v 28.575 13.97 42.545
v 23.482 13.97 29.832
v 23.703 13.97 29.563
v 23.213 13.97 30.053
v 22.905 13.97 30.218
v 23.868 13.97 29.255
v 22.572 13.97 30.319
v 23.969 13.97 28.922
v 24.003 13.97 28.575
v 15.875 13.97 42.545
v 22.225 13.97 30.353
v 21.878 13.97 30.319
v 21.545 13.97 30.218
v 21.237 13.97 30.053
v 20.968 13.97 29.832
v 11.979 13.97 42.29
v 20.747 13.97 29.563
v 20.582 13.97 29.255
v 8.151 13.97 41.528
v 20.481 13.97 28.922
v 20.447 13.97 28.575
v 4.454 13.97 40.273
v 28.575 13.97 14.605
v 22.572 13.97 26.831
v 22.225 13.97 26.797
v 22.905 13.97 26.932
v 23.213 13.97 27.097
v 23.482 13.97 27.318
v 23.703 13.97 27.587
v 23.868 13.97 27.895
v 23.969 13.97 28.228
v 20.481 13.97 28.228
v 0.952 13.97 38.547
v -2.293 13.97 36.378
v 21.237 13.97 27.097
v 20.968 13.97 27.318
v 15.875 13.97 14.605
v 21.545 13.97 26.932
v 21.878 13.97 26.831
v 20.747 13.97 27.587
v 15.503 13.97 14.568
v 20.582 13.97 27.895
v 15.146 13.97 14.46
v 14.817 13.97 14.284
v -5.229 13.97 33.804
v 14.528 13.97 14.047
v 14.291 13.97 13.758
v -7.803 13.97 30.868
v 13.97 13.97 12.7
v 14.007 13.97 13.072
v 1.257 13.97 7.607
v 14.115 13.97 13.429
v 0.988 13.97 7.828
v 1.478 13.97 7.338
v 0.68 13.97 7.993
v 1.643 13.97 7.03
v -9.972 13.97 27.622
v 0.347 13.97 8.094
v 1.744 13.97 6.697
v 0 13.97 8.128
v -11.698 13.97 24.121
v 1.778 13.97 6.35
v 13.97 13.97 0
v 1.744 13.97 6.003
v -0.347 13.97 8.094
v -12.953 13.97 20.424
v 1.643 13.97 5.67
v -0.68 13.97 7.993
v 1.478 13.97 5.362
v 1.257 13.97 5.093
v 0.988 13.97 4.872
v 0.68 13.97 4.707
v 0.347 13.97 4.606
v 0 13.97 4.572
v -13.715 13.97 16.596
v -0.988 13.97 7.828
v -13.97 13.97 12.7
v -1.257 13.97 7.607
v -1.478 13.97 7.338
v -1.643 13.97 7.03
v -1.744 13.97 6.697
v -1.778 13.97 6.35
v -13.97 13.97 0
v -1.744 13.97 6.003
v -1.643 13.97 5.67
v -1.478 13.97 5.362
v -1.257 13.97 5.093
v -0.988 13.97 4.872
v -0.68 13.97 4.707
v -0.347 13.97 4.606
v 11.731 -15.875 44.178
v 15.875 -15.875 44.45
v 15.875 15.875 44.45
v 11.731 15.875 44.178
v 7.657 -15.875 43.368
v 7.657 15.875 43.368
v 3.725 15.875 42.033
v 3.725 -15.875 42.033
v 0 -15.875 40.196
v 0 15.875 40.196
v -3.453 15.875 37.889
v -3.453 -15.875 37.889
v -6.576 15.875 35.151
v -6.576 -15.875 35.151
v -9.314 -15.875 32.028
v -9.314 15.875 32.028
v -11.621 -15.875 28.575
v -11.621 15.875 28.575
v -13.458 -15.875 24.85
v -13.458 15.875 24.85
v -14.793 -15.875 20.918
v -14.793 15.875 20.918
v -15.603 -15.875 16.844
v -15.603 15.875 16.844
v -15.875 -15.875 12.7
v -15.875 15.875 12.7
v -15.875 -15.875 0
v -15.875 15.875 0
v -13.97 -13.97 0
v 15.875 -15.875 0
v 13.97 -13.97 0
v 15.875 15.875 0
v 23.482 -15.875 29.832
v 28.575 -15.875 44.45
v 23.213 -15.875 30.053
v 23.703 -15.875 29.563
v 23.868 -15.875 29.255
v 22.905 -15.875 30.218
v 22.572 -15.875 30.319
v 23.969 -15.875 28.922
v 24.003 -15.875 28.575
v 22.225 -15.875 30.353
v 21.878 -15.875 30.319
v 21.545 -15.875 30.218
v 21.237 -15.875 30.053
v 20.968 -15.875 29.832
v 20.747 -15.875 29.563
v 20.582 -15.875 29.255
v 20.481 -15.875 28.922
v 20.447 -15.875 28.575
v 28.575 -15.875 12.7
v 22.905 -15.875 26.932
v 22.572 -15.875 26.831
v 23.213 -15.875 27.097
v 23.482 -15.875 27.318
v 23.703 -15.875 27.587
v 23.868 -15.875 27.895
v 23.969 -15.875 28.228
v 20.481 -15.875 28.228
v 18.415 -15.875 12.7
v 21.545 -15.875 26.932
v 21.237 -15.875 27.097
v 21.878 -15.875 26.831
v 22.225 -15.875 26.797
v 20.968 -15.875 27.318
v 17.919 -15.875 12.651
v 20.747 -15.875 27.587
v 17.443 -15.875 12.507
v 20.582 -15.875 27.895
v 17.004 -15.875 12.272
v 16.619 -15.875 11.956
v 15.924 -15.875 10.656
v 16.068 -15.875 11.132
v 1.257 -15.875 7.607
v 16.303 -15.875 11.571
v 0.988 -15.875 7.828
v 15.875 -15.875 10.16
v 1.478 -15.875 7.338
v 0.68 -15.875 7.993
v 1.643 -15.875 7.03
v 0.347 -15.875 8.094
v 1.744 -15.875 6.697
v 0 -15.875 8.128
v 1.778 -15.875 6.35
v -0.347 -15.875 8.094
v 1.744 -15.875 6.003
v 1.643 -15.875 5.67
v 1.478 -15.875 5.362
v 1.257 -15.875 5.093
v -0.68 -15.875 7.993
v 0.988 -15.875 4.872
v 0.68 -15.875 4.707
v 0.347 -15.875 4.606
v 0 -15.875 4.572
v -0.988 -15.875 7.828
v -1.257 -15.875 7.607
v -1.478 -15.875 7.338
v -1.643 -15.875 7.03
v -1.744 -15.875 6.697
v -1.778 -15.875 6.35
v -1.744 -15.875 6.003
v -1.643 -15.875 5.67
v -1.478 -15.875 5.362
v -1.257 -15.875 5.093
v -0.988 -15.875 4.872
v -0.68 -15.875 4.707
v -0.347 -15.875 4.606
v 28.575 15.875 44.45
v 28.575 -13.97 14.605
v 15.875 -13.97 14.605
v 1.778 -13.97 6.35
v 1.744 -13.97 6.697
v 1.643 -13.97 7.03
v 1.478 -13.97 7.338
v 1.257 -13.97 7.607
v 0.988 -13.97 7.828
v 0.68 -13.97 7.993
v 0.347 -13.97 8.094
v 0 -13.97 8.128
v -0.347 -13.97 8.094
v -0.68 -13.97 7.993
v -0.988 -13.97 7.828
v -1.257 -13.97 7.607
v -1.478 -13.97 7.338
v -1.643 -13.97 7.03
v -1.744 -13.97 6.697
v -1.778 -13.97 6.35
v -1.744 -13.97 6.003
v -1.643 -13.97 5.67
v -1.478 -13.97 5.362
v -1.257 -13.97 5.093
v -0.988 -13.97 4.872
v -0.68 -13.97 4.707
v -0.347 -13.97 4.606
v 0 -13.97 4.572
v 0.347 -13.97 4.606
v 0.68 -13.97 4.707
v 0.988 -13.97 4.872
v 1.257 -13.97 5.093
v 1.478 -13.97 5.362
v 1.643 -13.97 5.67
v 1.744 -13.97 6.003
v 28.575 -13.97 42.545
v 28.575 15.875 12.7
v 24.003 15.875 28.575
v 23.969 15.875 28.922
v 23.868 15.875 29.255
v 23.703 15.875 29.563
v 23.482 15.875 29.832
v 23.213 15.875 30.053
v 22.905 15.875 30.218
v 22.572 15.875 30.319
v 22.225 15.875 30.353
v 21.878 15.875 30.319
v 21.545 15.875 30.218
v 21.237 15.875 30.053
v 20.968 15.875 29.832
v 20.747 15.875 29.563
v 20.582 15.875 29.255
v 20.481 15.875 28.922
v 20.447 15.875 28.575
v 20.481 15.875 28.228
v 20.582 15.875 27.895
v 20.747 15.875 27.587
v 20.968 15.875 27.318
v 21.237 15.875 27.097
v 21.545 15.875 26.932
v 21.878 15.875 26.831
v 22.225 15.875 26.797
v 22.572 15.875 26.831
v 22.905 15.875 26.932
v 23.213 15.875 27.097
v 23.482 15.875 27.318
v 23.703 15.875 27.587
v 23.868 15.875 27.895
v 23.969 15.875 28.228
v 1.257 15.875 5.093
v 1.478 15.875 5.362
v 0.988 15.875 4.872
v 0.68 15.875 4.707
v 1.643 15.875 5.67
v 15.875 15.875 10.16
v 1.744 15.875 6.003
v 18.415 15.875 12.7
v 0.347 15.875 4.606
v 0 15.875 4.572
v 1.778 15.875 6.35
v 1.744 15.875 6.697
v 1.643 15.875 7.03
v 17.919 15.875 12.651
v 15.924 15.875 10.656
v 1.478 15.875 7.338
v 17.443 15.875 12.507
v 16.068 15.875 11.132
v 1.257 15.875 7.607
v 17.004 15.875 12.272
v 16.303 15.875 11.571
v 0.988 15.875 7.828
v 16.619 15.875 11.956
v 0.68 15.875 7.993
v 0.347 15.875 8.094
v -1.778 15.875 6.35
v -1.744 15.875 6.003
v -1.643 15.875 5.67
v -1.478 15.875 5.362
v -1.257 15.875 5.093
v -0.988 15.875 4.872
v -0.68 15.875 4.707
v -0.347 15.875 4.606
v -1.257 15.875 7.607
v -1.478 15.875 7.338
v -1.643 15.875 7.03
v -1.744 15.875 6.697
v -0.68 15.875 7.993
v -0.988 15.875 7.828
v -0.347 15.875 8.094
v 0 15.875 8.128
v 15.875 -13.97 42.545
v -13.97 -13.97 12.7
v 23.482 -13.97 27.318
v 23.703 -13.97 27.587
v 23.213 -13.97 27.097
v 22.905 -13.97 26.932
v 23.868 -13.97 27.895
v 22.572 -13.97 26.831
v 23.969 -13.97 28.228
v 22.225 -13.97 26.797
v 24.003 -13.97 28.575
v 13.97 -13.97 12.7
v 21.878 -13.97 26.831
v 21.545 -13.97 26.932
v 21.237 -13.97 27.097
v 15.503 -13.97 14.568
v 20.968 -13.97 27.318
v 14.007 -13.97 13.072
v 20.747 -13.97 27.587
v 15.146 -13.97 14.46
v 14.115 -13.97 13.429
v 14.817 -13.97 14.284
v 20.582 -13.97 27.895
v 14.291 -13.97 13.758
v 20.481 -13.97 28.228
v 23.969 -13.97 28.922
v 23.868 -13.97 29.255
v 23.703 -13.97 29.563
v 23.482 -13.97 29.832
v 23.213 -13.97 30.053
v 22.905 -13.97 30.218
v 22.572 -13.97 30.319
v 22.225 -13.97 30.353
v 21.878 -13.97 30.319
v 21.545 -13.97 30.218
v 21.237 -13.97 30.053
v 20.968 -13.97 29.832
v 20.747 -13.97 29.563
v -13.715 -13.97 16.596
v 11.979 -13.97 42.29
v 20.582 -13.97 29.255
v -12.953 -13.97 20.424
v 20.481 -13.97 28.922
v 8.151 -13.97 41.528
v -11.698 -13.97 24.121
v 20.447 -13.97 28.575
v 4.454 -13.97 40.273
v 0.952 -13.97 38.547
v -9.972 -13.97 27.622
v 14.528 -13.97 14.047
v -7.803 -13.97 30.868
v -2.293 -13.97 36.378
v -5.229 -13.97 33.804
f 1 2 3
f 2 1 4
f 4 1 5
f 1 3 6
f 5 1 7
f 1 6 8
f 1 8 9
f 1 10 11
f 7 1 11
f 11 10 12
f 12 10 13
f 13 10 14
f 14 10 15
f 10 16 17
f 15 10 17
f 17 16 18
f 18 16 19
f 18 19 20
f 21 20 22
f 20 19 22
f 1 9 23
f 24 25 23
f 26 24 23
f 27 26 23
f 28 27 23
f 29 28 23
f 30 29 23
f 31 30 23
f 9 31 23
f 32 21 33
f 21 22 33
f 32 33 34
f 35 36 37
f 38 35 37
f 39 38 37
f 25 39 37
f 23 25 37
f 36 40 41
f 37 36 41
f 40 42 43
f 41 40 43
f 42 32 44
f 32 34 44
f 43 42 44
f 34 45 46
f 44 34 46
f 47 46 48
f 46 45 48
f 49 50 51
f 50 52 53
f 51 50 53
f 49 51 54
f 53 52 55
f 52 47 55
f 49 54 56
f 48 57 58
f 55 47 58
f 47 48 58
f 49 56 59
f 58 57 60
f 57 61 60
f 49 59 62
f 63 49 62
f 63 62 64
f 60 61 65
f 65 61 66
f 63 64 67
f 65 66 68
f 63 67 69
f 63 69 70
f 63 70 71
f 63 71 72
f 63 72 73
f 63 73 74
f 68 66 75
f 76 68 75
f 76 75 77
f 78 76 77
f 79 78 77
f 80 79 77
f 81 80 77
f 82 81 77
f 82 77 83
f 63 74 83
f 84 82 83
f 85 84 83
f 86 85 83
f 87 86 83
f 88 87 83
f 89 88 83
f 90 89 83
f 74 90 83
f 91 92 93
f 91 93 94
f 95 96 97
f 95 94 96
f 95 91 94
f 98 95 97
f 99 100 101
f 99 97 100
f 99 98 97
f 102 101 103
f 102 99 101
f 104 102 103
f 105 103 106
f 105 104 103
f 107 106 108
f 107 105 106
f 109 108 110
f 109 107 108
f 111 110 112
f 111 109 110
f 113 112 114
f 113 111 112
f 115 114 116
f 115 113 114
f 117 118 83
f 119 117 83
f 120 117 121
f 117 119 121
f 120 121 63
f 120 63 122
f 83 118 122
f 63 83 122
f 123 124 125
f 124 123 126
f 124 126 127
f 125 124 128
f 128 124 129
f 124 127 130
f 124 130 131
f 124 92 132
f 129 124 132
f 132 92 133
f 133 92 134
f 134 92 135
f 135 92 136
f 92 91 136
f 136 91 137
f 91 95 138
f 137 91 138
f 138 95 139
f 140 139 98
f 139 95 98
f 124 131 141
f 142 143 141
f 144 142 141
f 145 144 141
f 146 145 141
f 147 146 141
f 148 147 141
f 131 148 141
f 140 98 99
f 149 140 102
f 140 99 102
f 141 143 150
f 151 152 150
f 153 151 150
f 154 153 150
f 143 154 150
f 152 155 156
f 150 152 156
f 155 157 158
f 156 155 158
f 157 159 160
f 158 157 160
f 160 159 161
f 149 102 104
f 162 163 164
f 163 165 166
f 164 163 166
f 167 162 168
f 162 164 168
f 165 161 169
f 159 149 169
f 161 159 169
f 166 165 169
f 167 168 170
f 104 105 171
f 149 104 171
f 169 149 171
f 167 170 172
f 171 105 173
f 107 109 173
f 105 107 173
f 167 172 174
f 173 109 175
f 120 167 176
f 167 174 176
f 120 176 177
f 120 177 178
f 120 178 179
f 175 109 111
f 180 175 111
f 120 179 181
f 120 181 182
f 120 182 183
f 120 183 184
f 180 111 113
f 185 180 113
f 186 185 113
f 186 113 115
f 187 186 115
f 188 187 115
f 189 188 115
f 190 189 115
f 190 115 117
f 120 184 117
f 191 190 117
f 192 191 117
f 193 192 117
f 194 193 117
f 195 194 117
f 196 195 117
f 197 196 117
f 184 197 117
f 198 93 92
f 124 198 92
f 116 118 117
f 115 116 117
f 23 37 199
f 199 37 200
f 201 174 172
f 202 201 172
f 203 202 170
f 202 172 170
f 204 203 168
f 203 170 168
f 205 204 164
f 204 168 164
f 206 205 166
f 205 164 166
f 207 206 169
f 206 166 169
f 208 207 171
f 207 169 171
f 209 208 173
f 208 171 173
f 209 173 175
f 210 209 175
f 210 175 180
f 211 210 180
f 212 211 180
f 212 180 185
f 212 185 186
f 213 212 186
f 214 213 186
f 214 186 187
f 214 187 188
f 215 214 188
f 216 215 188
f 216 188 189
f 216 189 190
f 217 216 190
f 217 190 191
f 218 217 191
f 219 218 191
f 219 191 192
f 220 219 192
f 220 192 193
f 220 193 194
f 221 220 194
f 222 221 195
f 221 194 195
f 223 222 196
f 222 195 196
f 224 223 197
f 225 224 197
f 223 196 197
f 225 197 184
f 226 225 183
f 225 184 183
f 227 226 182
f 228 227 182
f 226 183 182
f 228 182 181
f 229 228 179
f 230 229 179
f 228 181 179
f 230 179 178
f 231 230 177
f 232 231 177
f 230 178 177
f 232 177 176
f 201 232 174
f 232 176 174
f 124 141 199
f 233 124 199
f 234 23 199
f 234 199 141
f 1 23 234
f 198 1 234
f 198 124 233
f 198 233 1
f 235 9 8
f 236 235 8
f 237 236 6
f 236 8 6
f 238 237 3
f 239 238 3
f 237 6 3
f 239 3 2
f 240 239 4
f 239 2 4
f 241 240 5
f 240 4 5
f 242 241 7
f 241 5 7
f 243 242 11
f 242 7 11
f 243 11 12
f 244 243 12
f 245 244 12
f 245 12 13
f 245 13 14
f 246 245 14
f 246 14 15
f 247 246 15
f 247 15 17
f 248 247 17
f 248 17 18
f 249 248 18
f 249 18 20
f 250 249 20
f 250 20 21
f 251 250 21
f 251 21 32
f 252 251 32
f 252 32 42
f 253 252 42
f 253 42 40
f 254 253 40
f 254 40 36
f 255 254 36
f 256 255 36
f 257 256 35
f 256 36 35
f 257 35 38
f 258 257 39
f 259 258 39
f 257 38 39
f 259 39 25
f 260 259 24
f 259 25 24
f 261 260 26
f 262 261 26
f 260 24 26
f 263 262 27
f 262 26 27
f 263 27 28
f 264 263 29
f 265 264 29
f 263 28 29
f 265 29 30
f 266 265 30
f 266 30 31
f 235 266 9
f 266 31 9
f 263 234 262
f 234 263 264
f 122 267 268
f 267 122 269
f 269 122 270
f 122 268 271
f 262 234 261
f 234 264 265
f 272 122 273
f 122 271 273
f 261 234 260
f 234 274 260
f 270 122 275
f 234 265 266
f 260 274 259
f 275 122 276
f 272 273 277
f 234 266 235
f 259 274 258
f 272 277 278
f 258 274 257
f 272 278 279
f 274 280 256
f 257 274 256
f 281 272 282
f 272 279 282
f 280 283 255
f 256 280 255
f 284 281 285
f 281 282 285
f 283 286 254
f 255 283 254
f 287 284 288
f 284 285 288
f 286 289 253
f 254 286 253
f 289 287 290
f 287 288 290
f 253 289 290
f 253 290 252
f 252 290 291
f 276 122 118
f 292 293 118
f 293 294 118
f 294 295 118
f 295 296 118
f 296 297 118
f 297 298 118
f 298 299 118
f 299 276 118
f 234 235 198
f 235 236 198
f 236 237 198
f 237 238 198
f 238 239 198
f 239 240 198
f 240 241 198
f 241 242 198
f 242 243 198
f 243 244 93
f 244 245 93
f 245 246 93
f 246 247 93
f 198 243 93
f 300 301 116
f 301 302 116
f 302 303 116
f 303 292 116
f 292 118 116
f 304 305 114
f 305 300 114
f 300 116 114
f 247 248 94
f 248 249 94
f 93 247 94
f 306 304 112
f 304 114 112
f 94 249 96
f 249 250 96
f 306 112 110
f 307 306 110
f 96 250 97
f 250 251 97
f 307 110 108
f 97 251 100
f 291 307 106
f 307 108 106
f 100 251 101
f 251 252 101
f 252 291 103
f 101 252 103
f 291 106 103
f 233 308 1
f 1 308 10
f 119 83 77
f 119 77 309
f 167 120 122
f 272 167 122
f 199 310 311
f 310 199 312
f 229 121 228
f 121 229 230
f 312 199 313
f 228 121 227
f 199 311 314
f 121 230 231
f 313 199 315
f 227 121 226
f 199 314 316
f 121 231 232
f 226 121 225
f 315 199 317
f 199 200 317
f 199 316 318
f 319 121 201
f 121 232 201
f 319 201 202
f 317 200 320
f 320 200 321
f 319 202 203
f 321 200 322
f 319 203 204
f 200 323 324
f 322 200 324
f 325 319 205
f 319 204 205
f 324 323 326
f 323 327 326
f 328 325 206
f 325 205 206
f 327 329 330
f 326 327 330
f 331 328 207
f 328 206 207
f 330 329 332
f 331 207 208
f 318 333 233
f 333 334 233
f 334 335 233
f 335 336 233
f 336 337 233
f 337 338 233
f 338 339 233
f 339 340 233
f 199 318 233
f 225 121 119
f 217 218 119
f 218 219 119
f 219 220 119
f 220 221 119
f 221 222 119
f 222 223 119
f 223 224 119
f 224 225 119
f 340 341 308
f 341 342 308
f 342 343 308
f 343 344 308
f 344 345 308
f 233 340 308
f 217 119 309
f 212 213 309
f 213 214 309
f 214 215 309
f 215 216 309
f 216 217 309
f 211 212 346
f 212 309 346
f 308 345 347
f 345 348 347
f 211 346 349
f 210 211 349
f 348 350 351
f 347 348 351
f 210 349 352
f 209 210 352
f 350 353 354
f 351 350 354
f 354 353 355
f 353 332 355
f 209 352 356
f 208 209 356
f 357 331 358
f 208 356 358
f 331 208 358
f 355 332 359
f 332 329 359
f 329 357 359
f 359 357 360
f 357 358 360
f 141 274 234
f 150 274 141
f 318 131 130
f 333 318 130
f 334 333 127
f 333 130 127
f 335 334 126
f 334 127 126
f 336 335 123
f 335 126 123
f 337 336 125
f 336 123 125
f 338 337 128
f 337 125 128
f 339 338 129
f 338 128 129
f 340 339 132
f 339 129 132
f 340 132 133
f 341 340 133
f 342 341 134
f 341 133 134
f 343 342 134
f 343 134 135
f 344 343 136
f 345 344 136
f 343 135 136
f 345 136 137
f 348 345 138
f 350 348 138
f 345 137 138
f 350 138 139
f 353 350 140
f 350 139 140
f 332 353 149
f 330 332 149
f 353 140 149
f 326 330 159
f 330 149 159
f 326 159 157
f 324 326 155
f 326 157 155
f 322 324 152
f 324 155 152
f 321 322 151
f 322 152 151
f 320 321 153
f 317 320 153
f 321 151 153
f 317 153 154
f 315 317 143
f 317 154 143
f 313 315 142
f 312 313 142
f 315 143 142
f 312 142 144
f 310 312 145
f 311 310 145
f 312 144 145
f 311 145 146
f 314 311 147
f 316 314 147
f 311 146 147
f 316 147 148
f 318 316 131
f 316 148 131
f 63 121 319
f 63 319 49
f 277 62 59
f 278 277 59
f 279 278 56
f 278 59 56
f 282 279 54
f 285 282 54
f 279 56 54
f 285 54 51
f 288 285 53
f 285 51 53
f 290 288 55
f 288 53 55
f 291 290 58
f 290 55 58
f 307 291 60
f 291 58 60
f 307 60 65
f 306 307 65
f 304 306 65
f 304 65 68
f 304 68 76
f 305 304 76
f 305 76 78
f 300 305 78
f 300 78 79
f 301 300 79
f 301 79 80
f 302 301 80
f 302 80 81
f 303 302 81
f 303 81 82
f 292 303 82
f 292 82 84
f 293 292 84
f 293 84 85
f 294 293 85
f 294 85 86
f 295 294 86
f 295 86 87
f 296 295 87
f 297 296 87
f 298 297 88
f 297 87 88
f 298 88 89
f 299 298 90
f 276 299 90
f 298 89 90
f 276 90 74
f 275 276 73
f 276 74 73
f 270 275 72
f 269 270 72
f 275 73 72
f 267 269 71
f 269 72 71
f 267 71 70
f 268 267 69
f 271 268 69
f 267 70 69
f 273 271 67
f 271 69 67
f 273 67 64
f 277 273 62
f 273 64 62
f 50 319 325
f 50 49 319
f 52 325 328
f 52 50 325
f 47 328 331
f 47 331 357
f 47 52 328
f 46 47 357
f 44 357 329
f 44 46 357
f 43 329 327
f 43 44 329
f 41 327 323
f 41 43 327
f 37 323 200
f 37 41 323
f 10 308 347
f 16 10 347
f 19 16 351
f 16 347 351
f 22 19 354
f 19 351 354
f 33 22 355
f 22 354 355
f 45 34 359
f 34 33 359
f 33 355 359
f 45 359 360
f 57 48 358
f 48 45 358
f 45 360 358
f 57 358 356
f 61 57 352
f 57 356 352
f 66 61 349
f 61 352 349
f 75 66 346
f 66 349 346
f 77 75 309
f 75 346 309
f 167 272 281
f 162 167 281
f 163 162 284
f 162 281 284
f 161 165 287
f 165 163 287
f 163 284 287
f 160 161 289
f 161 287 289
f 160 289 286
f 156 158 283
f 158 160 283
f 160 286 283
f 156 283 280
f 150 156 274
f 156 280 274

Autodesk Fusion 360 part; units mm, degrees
sketch "Sketch1" plane through (0, 0, 0) normal (0, 0, 1) x (1, 0, 0)
  line L0 (13.97, 13.97) -> (-13.97, 13.97)
  line L1 (-13.97, 13.97) -> (-13.97, -13.97)
  line L2 (-13.97, -13.97) -> (13.97, -13.97)
  line L3 (13.97, -13.97) -> (13.97, 13.97)
  line L4 (13.97, 13.97) -> (-13.97, -13.97) construction
  line L5 (-13.97, 13.97) -> (13.97, -13.97) construction
  line L6 (15.875, 15.875) -> (-15.875, 15.875)
  line L7 (-15.875, 15.875) -> (-15.875, -15.875)
  line L8 (-15.875, -15.875) -> (15.875, -15.875)
  line L9 (15.875, -15.875) -> (15.875, 15.875)
  line L10 (15.875, 15.875) -> (-15.875, -15.875) construction
  line L11 (-15.875, 15.875) -> (15.875, -15.875) construction
  dimension "d1" = 27.94
  dimension "d2" = 27.94
  dimension "d3" = 31.75
  dimension "d4" = 31.75
extrude "Extrude1" add sketch "Sketch1" along normal blind 12.7
revolve "Revolve1" add 1 faces at (-15.24, -4.6567, 12.7) angle 90 about axis through (15.875, -15.875, 12.7) along (0, 1, 0)
sketch "Sketch3" plane through (15.875, 0, 0) normal (1, 0, 0) x (0, 1, 0)
  line L0 (13.97, 14.605) -> (-13.97, 14.605)
  line L1 (-13.97, 14.605) -> (-13.97, 42.545)
  line L2 (-13.97, 42.545) -> (13.97, 42.545)
  line L3 (13.97, 42.545) -> (13.97, 14.605)
  line L4 (-15.875, 0) -> (15.875, 0)
  line L5 (15.875, 0) -> (15.875, 44.45)
  line L6 (15.875, 44.45) -> (-15.875, 44.45)
  line L7 (-15.875, 44.45) -> (-15.875, 0)
  line L8 (-13.97, 42.545) -> (13.97, 42.545)
  line L9 (13.97, 42.545) -> (13.97, 14.605)
  line L10 (13.97, 14.605) -> (-13.97, 14.605)
  line L11 (-13.97, 14.605) -> (-13.97, 42.545)
  line L12 (-15.875, 44.45) -> (14.2875, 44.45)
  line L13 (14.2875, 12.7) -> (-15.875, 12.7)
  line L14 (-15.875, 12.7) -> (-15.875, 44.45)
  line L15 (14.2875, 12.7) -> (15.875, 12.7)
  dimension "d10" = 31.75
extrude "Extrude2" add sketch "Sketch3" along normal blind 12.7 contours L5 L6 L7 L12 L13 L14 L15
fillet "Fillet1" radius 2.54 1 edges at (15.875, 0, 12.7)
sketch "Sketch5" plane through (0, 0, 12.7) normal (0, 0, -1) x (1, 0, 0)
  line L0 (18.415, 15.875) -> (18.415, -15.875)
  line L1 (18.415, -15.875) -> (28.575, -15.875)
  line L2 (28.575, -15.875) -> (28.575, 15.875)
  line L3 (28.575, 15.875) -> (18.415, 15.875)
sketch "Sketch6" plane through (0, -15.875, 0) normal (0, -1, 0) x (1, 0, 0)
  line L0 (-15.875, 0) -> (15.875, 0)
  line L1 (15.875, 0) -> (15.875, 10.16)
  arc A0 (18.415, 12.7) -> (15.875, 10.16) centre (18.415, 10.16) ccw
  line L2 (18.415, 12.7) -> (28.575, 12.7)
  line L3 (28.575, 12.7) -> (28.575, 44.45)
  line L4 (28.575, 44.45) -> (15.875, 44.45)
  arc A1 (15.875, 44.45) -> (-15.875, 12.7) centre (15.875, 12.7) ccw
  line L5 (-15.875, 12.7) -> (-15.875, 0)
  circle A2 centre (22.225, 28.575) radius 1.778
  line L6 (28.575, 12.7) -> (18.415, 12.7)
  dimension "d19" = 3.556
  dimension "d20" = 6.35
  dimension "d21" = 15.875
extrude "Extrude4" cut sketch "Sketch6" against normal blind 33.02 contours A2
sketch "Sketch7" plane through (0, -15.875, 0) normal (0, -1, 0) x (1, 0, 0)
  circle A0 centre (22.225, 28.575) radius 1.778
  line L0 (-15.875, 0) -> (15.875, 0)
  line L1 (15.875, 0) -> (15.875, 10.16)
  arc A1 (18.415, 12.7) -> (15.875, 10.16) centre (18.415, 10.16) ccw
  line L2 (18.415, 12.7) -> (28.575, 12.7)
  line L3 (28.575, 12.7) -> (28.575, 44.45)
  line L4 (28.575, 44.45) -> (15.875, 44.45)
  arc A2 (15.875, 44.45) -> (-15.875, 12.7) centre (15.875, 12.7) ccw
  line L5 (-15.875, 12.7) -> (-15.875, 0)
  circle A3 centre (0, 6.35) radius 1.778
  dimension "d24" = 3.556
  dimension "d25" = 6.35
  dimension "d26" = 15.875
extrude "Extrude5" cut sketch "Sketch7" against normal blind 35.56 contours A3
equation "d21 = ( 1.25 / 2 ) * 1 in"
